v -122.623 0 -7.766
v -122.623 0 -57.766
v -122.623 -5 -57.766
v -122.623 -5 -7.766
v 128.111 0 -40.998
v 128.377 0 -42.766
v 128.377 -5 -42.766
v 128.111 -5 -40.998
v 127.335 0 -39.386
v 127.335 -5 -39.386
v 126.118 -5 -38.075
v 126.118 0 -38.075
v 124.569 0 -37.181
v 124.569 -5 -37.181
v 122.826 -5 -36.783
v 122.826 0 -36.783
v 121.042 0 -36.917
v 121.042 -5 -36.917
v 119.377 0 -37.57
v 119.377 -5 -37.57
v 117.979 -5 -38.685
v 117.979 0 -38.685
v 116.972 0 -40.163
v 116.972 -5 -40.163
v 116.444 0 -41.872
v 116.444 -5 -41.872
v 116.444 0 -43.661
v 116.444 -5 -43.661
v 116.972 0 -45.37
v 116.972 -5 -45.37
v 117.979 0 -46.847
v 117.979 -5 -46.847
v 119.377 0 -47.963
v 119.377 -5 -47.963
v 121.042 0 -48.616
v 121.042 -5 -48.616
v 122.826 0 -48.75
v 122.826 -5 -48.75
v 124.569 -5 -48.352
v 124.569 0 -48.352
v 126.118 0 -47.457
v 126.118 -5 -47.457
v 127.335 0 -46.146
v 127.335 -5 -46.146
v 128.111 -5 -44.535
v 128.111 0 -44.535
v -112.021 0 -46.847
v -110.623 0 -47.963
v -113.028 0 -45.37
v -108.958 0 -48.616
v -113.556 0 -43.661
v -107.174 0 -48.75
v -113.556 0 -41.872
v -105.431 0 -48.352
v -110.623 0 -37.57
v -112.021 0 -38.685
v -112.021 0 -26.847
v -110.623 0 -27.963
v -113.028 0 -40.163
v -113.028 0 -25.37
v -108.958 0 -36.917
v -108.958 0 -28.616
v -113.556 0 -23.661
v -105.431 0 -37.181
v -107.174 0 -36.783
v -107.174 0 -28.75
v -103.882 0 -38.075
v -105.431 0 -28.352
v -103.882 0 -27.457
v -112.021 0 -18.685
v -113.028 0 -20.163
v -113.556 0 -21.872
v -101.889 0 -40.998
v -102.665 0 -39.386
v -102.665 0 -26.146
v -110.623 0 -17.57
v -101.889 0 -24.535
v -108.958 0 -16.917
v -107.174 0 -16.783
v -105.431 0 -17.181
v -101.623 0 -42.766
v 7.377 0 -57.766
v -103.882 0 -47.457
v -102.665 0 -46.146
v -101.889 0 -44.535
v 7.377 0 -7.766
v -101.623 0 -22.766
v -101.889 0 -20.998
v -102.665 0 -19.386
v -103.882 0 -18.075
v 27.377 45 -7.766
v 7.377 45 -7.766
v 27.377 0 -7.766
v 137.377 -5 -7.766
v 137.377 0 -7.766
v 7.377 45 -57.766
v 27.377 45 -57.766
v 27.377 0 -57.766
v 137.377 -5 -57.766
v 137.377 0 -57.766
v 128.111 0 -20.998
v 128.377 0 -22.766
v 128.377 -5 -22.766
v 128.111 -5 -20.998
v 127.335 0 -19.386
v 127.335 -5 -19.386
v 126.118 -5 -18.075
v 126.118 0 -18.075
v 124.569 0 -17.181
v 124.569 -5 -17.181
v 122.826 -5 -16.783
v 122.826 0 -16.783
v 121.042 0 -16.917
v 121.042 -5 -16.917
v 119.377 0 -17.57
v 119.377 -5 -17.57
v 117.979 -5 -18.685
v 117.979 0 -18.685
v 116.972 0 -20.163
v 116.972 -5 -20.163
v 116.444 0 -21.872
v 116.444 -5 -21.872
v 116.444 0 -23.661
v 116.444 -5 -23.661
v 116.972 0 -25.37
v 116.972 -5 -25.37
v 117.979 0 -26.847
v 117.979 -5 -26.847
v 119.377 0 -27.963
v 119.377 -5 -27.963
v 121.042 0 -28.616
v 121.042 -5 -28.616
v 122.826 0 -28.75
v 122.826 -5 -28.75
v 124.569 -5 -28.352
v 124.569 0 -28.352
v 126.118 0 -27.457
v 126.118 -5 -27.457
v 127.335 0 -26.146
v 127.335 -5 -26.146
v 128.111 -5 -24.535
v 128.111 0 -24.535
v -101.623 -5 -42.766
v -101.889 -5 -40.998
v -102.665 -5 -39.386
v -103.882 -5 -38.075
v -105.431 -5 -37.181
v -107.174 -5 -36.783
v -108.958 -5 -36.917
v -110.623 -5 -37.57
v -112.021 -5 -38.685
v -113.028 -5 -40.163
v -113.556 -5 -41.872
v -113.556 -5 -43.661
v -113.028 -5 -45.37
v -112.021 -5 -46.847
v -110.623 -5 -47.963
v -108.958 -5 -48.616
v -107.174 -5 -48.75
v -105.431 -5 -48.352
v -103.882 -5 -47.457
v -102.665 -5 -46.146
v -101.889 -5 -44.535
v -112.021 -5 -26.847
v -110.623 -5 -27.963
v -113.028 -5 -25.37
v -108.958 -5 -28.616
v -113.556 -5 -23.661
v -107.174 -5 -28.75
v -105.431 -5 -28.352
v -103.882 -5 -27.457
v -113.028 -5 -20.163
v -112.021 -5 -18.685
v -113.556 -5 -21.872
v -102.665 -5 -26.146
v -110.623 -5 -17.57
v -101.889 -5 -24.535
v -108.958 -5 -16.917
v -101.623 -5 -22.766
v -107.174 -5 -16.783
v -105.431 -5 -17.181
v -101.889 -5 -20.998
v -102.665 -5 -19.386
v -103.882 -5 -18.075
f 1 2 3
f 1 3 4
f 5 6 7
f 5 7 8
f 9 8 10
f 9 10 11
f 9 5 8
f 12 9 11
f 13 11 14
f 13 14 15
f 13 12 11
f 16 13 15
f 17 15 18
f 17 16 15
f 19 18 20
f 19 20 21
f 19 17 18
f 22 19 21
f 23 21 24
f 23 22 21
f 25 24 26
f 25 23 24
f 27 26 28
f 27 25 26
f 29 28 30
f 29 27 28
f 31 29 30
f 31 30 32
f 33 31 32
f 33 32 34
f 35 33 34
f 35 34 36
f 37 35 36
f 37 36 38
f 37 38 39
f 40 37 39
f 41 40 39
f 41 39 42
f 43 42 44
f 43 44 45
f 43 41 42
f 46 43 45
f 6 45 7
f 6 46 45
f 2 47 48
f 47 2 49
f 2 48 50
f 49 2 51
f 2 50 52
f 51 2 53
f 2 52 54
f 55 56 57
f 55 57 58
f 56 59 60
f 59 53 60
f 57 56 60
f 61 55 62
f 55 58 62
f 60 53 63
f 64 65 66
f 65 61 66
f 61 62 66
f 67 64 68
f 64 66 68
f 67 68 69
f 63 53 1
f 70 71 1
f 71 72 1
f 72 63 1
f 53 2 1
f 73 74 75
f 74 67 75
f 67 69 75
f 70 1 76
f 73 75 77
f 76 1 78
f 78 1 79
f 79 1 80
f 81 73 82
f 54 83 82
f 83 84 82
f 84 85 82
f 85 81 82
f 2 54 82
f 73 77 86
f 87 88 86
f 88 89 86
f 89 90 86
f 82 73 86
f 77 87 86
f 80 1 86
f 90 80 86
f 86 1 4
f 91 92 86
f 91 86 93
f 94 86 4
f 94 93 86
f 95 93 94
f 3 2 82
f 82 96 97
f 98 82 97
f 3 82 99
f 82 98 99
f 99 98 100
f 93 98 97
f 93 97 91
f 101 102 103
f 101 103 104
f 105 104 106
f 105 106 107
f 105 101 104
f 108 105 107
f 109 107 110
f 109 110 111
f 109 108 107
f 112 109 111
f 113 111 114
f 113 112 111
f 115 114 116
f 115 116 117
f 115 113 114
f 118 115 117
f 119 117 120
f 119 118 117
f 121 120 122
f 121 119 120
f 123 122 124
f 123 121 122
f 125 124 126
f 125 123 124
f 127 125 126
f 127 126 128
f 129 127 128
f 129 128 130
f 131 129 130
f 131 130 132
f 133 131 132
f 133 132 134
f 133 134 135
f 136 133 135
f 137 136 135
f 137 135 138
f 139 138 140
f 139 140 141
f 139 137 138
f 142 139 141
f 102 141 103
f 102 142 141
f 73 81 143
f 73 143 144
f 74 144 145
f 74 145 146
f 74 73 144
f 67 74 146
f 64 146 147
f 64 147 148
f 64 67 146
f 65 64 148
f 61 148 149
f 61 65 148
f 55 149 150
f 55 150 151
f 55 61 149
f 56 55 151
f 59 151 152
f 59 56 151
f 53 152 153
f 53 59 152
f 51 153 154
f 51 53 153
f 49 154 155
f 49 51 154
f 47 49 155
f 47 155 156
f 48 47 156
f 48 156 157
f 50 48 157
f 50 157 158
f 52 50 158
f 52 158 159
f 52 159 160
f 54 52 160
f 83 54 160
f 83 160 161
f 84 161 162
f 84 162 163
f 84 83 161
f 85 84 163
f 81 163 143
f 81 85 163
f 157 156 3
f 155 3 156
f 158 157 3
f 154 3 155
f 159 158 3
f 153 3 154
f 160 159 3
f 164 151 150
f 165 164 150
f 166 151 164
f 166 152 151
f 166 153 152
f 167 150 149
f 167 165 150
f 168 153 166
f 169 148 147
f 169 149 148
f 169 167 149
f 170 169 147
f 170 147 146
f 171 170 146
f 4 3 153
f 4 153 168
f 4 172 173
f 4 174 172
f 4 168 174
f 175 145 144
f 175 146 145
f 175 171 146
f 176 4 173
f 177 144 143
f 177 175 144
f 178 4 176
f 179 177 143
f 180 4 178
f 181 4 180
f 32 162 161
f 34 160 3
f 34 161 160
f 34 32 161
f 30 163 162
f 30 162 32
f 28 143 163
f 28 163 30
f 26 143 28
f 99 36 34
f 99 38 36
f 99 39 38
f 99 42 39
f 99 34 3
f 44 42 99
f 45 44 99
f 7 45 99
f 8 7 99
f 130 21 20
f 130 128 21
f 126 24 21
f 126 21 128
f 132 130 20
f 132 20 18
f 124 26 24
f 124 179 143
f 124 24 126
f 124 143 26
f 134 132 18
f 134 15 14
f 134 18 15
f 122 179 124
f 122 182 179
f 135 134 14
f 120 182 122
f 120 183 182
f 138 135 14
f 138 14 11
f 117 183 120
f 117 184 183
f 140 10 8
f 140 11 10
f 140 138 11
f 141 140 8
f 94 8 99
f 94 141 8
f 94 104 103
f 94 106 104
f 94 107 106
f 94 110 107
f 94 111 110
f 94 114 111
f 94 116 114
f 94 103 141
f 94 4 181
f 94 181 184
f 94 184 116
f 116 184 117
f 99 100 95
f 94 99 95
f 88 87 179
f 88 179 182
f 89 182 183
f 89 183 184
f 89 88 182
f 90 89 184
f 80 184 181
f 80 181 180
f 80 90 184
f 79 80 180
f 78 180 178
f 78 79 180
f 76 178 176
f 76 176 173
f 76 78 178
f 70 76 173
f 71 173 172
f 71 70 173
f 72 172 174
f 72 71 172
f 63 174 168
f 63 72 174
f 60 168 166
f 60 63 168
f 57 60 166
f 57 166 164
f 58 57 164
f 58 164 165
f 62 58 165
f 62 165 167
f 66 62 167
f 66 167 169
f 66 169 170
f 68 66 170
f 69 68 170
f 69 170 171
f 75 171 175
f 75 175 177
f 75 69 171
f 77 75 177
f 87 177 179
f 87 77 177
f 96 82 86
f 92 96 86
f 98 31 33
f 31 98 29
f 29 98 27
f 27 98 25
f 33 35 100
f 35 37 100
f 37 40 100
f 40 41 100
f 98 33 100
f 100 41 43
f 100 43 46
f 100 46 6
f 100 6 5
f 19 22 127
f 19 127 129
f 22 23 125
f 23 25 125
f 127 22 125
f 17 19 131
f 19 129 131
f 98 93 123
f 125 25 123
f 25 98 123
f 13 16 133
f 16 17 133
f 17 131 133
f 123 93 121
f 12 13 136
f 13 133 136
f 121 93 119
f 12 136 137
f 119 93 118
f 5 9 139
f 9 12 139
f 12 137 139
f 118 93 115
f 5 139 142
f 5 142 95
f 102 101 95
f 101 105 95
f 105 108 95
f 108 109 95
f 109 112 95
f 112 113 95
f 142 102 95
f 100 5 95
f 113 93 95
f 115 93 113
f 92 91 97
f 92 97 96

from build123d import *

# Parameters (mm, degrees)
F0_W     = 260
F0_H     = 50
F1_DEPTH = 5
F2_W     = 20
F2_H     = 50
F3_DEPTH = 45
F4_R     = 6
F5_DEPTH = 5


with BuildPart() as f1:
    # F0 (on Front) → F1 (new body)
    with BuildSketch(Plane.XZ):
        with Locations((7.377451, -32.76636)):
            Rectangle(F0_W, F0_H)
    extrude(amount=F1_DEPTH)

    # F2 (on face) → F3 (join)
    with BuildSketch(Plane(origin=(0, 0, 0), x_dir=(-1, 0, 0), z_dir=(0, 1, 0))):
        with Locations((-17.377451, -32.76636)):
            Rectangle(F2_W, F2_H)
    extrude(amount=F3_DEPTH)

    # F4 (on Front) → F5 (cut, through all)
    with BuildSketch(Plane.XZ):
        with Locations((122.377451, -42.76636)):
            Circle(F4_R)
        with Locations((122.377451, -22.76636)):
            Circle(F4_R)
        with Locations((-107.622549, -42.76636)):
            Circle(F4_R)
        with Locations((-107.622549, -22.76636)):
            Circle(F4_R)
    extrude(amount=F5_DEPTH, mode=Mode.SUBTRACT)


solid = f1.part
